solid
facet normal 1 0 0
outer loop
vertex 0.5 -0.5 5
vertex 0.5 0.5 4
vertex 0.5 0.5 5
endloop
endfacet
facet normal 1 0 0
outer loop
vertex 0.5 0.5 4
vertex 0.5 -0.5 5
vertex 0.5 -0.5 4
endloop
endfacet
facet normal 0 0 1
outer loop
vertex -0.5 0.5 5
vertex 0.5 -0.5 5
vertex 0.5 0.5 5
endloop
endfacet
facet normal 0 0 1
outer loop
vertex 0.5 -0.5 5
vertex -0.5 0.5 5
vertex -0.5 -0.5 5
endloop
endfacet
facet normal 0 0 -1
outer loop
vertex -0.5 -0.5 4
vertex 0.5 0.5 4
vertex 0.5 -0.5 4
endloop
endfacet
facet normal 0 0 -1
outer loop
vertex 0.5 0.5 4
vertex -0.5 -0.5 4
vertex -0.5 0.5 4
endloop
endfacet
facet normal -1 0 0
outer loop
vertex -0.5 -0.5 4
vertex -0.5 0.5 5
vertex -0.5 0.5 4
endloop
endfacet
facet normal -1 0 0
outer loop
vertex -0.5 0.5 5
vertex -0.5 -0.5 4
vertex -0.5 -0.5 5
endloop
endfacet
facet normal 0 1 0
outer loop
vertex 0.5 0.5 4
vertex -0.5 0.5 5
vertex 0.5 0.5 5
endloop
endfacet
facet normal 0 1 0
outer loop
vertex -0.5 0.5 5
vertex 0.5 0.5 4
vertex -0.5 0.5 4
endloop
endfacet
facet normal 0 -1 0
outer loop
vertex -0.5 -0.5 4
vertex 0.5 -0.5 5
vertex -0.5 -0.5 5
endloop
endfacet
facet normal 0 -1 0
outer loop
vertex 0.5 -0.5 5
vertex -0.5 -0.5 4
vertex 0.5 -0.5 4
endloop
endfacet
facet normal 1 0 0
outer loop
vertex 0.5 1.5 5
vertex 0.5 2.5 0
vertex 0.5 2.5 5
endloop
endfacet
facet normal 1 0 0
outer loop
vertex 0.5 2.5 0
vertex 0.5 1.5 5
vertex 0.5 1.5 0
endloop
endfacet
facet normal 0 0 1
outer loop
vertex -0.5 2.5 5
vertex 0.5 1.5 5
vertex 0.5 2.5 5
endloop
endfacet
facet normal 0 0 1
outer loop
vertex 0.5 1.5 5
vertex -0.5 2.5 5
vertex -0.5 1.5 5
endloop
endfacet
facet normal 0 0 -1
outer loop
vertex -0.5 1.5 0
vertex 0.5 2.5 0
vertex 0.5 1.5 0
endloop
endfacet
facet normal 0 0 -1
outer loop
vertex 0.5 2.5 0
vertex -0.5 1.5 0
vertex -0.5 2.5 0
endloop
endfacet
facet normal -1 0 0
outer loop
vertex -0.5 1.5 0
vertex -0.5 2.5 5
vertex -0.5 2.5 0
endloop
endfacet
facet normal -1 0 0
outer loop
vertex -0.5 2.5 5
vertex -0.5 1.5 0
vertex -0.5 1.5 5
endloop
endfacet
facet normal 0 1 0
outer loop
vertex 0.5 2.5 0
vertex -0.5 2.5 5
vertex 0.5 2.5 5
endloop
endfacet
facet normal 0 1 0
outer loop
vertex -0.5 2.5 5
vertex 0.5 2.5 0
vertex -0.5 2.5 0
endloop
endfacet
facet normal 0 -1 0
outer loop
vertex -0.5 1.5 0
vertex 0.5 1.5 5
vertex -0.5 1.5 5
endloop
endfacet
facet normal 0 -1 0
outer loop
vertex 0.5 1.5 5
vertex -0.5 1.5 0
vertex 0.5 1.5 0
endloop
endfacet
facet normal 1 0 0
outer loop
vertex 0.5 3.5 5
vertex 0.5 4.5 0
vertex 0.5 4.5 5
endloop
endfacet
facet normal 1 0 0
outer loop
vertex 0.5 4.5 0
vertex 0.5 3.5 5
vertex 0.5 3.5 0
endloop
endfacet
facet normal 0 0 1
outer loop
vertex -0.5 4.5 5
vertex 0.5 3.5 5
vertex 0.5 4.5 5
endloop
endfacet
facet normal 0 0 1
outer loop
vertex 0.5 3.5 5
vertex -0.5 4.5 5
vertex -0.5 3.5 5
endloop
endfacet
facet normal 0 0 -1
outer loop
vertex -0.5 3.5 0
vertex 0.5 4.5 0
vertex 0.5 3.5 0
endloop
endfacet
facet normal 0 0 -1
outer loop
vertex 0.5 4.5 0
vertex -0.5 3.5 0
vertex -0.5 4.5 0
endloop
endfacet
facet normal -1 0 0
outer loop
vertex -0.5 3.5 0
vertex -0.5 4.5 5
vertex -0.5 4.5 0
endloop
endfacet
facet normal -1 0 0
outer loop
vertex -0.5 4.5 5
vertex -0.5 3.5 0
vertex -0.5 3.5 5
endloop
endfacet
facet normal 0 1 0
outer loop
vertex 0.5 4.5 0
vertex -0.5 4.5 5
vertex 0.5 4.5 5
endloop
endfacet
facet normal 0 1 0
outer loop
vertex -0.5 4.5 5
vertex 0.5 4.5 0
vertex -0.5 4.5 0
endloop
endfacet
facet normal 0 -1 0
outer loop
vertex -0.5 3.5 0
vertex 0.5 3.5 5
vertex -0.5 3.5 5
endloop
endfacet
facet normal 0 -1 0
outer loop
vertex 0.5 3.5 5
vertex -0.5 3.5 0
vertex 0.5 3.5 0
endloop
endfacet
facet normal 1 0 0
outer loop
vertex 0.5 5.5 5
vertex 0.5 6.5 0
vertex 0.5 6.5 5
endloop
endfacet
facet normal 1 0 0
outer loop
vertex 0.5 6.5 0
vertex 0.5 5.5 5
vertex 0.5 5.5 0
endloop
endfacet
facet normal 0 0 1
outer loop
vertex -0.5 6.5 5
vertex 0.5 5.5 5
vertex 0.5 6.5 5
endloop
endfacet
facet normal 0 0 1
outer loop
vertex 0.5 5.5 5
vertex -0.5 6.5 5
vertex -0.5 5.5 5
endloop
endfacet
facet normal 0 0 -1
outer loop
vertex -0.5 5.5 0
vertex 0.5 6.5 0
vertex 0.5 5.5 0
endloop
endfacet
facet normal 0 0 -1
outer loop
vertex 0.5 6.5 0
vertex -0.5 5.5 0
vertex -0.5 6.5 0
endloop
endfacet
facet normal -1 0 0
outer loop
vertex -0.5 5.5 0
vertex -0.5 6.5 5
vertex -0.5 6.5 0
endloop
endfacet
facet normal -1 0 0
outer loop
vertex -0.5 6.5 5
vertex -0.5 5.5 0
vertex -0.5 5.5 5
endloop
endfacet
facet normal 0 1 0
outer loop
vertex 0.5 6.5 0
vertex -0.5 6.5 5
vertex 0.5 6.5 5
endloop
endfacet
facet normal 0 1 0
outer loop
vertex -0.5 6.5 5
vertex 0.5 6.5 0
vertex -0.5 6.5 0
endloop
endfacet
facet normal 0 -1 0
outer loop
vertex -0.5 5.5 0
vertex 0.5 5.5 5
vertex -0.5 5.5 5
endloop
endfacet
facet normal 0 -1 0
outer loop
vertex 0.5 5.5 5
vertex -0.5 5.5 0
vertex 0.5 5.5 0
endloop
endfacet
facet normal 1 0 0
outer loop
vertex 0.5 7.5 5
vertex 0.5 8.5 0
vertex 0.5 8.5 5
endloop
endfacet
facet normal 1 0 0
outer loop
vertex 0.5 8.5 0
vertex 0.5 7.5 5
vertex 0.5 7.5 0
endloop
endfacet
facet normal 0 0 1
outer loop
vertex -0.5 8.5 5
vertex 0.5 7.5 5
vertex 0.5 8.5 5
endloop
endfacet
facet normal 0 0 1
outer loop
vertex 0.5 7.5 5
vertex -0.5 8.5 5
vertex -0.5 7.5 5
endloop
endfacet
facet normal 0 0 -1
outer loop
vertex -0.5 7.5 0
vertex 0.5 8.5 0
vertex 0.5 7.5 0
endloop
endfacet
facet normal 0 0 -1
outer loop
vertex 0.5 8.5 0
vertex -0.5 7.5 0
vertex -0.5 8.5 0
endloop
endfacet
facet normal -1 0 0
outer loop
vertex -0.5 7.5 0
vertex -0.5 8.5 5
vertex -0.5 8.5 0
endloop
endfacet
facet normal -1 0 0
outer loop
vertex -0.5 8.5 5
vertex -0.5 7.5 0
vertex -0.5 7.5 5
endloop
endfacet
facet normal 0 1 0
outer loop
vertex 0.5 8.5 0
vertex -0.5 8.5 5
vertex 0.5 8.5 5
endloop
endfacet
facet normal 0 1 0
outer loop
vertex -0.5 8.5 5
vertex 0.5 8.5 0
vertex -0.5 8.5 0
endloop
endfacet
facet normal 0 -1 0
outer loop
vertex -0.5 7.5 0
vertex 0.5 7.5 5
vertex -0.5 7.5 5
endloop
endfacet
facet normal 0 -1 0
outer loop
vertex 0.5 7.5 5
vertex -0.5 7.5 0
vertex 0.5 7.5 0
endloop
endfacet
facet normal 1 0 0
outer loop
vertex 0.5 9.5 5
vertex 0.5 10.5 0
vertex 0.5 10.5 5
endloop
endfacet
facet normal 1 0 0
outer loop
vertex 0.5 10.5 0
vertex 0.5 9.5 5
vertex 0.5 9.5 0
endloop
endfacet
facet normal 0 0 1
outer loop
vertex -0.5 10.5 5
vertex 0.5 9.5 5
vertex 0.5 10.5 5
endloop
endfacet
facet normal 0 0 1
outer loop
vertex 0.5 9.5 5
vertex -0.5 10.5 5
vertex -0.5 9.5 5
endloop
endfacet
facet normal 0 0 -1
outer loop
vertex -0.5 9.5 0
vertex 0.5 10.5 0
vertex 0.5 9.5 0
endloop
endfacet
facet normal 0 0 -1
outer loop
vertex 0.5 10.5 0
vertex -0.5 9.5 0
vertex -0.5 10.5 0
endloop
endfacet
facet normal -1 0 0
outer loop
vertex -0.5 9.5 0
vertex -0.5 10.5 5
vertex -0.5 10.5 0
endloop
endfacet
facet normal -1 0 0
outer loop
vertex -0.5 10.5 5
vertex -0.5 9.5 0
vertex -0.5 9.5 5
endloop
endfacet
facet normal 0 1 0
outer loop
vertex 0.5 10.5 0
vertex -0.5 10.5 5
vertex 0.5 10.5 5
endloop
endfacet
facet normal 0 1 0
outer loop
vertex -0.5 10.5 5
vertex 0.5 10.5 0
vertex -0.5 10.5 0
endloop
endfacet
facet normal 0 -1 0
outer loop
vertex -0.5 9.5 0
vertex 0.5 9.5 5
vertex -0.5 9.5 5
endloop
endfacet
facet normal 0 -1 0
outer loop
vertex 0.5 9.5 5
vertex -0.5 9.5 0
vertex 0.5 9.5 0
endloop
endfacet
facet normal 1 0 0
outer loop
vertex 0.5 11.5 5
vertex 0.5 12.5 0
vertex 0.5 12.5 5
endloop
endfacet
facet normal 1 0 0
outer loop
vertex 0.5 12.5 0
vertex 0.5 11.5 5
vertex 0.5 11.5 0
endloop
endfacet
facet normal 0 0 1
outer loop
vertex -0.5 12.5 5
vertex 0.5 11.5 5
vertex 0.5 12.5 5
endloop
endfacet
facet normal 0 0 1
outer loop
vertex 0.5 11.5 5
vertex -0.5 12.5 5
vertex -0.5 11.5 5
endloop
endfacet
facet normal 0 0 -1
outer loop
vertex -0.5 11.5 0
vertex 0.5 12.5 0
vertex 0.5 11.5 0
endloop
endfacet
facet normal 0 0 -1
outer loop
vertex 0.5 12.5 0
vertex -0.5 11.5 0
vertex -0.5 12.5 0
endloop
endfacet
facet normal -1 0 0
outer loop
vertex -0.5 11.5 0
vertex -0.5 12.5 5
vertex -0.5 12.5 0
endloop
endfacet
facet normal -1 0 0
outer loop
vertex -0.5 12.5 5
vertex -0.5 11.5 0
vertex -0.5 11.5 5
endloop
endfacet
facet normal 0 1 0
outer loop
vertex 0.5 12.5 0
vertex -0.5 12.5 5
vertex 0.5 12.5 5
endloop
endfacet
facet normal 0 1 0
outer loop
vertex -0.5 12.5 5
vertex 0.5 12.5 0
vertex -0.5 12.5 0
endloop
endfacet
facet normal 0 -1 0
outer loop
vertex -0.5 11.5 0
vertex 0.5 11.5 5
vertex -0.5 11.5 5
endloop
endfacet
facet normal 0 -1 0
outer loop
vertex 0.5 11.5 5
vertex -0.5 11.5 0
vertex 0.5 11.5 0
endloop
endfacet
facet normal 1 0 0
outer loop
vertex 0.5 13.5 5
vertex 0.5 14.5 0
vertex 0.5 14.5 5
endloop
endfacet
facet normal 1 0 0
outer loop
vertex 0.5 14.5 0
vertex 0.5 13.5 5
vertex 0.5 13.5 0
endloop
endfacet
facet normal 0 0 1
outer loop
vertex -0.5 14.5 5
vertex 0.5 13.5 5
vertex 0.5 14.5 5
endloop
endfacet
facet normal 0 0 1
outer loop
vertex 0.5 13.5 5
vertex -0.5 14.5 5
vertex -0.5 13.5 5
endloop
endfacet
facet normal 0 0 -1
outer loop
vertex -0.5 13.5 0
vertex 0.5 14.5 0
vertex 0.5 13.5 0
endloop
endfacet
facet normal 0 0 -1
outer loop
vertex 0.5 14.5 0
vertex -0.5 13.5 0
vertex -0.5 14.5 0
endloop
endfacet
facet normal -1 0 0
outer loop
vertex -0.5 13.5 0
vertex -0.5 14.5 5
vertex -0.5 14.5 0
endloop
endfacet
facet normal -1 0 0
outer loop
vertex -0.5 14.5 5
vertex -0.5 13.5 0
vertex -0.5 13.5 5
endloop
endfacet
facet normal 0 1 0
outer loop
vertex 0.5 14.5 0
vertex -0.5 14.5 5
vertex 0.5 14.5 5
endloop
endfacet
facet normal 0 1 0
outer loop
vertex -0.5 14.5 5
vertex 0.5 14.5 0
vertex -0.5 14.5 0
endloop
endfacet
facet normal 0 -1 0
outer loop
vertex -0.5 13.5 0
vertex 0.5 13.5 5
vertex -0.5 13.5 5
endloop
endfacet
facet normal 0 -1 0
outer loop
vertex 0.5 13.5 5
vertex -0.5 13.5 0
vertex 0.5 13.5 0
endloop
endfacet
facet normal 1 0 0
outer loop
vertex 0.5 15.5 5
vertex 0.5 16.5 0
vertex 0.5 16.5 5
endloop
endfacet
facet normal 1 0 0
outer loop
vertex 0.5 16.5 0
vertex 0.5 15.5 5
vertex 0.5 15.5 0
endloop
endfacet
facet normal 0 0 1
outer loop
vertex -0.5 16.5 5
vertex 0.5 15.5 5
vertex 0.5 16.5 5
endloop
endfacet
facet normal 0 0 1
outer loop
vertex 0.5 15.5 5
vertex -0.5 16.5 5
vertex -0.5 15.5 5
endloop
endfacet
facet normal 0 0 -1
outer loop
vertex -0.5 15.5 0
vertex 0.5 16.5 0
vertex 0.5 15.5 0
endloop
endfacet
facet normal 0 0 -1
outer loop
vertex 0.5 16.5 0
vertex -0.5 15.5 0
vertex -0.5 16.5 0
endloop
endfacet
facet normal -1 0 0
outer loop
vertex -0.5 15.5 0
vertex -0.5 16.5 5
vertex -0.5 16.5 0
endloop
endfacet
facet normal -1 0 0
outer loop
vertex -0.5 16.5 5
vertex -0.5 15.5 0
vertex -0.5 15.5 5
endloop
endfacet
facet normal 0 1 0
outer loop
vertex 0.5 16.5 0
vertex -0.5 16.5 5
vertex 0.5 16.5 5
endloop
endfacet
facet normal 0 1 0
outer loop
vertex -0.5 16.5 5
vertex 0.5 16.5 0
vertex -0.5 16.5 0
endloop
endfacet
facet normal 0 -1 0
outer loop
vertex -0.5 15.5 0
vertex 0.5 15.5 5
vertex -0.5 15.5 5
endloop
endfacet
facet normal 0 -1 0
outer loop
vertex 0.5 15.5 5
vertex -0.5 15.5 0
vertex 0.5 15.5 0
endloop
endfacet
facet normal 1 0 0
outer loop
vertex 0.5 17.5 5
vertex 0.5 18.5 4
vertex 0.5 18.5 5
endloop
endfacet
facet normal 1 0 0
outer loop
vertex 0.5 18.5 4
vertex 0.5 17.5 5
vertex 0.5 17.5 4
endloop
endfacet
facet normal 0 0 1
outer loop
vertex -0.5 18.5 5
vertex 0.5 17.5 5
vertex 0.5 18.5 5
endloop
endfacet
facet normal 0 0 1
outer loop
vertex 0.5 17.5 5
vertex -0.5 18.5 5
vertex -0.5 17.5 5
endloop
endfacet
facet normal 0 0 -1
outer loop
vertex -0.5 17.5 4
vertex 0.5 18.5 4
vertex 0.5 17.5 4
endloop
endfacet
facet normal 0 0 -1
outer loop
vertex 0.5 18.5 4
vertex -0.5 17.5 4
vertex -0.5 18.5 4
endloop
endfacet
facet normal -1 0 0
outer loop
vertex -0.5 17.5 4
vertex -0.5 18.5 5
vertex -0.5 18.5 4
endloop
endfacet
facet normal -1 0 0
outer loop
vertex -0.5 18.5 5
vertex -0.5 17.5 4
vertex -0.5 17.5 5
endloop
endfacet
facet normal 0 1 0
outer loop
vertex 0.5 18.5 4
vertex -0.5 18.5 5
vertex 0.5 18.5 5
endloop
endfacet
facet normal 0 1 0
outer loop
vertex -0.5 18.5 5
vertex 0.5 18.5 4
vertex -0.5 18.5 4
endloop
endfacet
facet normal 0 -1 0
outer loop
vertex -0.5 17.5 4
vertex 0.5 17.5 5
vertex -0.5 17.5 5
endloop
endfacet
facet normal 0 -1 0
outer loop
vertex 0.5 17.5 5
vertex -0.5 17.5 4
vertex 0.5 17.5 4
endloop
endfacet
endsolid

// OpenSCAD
union() {
    translate([0, 0, 4.5]) color([1, 0, 0]) cube([1, 1, 1], center=true);
    translate([0, 2, 2.5]) cube([1, 1, 5], center=true);
    translate([0, 4, 2.5]) cube([1, 1, 5], center=true);
    translate([0, 6, 2.5]) cube([1, 1, 5], center=true);
    translate([0, 8, 2.5]) cube([1, 1, 5], center=true);
    translate([0, 10, 2.5]) cube([1, 1, 5], center=true);
    translate([0, 12, 2.5]) cube([1, 1, 5], center=true);
    translate([0, 14, 2.5]) cube([1, 1, 5], center=true);
    translate([0, 16, 2.5]) cube([1, 1, 5], center=true);
    translate([0, 18, 4.5]) color([0, 0, 1]) cube([1, 1, 1], center=true);
}
